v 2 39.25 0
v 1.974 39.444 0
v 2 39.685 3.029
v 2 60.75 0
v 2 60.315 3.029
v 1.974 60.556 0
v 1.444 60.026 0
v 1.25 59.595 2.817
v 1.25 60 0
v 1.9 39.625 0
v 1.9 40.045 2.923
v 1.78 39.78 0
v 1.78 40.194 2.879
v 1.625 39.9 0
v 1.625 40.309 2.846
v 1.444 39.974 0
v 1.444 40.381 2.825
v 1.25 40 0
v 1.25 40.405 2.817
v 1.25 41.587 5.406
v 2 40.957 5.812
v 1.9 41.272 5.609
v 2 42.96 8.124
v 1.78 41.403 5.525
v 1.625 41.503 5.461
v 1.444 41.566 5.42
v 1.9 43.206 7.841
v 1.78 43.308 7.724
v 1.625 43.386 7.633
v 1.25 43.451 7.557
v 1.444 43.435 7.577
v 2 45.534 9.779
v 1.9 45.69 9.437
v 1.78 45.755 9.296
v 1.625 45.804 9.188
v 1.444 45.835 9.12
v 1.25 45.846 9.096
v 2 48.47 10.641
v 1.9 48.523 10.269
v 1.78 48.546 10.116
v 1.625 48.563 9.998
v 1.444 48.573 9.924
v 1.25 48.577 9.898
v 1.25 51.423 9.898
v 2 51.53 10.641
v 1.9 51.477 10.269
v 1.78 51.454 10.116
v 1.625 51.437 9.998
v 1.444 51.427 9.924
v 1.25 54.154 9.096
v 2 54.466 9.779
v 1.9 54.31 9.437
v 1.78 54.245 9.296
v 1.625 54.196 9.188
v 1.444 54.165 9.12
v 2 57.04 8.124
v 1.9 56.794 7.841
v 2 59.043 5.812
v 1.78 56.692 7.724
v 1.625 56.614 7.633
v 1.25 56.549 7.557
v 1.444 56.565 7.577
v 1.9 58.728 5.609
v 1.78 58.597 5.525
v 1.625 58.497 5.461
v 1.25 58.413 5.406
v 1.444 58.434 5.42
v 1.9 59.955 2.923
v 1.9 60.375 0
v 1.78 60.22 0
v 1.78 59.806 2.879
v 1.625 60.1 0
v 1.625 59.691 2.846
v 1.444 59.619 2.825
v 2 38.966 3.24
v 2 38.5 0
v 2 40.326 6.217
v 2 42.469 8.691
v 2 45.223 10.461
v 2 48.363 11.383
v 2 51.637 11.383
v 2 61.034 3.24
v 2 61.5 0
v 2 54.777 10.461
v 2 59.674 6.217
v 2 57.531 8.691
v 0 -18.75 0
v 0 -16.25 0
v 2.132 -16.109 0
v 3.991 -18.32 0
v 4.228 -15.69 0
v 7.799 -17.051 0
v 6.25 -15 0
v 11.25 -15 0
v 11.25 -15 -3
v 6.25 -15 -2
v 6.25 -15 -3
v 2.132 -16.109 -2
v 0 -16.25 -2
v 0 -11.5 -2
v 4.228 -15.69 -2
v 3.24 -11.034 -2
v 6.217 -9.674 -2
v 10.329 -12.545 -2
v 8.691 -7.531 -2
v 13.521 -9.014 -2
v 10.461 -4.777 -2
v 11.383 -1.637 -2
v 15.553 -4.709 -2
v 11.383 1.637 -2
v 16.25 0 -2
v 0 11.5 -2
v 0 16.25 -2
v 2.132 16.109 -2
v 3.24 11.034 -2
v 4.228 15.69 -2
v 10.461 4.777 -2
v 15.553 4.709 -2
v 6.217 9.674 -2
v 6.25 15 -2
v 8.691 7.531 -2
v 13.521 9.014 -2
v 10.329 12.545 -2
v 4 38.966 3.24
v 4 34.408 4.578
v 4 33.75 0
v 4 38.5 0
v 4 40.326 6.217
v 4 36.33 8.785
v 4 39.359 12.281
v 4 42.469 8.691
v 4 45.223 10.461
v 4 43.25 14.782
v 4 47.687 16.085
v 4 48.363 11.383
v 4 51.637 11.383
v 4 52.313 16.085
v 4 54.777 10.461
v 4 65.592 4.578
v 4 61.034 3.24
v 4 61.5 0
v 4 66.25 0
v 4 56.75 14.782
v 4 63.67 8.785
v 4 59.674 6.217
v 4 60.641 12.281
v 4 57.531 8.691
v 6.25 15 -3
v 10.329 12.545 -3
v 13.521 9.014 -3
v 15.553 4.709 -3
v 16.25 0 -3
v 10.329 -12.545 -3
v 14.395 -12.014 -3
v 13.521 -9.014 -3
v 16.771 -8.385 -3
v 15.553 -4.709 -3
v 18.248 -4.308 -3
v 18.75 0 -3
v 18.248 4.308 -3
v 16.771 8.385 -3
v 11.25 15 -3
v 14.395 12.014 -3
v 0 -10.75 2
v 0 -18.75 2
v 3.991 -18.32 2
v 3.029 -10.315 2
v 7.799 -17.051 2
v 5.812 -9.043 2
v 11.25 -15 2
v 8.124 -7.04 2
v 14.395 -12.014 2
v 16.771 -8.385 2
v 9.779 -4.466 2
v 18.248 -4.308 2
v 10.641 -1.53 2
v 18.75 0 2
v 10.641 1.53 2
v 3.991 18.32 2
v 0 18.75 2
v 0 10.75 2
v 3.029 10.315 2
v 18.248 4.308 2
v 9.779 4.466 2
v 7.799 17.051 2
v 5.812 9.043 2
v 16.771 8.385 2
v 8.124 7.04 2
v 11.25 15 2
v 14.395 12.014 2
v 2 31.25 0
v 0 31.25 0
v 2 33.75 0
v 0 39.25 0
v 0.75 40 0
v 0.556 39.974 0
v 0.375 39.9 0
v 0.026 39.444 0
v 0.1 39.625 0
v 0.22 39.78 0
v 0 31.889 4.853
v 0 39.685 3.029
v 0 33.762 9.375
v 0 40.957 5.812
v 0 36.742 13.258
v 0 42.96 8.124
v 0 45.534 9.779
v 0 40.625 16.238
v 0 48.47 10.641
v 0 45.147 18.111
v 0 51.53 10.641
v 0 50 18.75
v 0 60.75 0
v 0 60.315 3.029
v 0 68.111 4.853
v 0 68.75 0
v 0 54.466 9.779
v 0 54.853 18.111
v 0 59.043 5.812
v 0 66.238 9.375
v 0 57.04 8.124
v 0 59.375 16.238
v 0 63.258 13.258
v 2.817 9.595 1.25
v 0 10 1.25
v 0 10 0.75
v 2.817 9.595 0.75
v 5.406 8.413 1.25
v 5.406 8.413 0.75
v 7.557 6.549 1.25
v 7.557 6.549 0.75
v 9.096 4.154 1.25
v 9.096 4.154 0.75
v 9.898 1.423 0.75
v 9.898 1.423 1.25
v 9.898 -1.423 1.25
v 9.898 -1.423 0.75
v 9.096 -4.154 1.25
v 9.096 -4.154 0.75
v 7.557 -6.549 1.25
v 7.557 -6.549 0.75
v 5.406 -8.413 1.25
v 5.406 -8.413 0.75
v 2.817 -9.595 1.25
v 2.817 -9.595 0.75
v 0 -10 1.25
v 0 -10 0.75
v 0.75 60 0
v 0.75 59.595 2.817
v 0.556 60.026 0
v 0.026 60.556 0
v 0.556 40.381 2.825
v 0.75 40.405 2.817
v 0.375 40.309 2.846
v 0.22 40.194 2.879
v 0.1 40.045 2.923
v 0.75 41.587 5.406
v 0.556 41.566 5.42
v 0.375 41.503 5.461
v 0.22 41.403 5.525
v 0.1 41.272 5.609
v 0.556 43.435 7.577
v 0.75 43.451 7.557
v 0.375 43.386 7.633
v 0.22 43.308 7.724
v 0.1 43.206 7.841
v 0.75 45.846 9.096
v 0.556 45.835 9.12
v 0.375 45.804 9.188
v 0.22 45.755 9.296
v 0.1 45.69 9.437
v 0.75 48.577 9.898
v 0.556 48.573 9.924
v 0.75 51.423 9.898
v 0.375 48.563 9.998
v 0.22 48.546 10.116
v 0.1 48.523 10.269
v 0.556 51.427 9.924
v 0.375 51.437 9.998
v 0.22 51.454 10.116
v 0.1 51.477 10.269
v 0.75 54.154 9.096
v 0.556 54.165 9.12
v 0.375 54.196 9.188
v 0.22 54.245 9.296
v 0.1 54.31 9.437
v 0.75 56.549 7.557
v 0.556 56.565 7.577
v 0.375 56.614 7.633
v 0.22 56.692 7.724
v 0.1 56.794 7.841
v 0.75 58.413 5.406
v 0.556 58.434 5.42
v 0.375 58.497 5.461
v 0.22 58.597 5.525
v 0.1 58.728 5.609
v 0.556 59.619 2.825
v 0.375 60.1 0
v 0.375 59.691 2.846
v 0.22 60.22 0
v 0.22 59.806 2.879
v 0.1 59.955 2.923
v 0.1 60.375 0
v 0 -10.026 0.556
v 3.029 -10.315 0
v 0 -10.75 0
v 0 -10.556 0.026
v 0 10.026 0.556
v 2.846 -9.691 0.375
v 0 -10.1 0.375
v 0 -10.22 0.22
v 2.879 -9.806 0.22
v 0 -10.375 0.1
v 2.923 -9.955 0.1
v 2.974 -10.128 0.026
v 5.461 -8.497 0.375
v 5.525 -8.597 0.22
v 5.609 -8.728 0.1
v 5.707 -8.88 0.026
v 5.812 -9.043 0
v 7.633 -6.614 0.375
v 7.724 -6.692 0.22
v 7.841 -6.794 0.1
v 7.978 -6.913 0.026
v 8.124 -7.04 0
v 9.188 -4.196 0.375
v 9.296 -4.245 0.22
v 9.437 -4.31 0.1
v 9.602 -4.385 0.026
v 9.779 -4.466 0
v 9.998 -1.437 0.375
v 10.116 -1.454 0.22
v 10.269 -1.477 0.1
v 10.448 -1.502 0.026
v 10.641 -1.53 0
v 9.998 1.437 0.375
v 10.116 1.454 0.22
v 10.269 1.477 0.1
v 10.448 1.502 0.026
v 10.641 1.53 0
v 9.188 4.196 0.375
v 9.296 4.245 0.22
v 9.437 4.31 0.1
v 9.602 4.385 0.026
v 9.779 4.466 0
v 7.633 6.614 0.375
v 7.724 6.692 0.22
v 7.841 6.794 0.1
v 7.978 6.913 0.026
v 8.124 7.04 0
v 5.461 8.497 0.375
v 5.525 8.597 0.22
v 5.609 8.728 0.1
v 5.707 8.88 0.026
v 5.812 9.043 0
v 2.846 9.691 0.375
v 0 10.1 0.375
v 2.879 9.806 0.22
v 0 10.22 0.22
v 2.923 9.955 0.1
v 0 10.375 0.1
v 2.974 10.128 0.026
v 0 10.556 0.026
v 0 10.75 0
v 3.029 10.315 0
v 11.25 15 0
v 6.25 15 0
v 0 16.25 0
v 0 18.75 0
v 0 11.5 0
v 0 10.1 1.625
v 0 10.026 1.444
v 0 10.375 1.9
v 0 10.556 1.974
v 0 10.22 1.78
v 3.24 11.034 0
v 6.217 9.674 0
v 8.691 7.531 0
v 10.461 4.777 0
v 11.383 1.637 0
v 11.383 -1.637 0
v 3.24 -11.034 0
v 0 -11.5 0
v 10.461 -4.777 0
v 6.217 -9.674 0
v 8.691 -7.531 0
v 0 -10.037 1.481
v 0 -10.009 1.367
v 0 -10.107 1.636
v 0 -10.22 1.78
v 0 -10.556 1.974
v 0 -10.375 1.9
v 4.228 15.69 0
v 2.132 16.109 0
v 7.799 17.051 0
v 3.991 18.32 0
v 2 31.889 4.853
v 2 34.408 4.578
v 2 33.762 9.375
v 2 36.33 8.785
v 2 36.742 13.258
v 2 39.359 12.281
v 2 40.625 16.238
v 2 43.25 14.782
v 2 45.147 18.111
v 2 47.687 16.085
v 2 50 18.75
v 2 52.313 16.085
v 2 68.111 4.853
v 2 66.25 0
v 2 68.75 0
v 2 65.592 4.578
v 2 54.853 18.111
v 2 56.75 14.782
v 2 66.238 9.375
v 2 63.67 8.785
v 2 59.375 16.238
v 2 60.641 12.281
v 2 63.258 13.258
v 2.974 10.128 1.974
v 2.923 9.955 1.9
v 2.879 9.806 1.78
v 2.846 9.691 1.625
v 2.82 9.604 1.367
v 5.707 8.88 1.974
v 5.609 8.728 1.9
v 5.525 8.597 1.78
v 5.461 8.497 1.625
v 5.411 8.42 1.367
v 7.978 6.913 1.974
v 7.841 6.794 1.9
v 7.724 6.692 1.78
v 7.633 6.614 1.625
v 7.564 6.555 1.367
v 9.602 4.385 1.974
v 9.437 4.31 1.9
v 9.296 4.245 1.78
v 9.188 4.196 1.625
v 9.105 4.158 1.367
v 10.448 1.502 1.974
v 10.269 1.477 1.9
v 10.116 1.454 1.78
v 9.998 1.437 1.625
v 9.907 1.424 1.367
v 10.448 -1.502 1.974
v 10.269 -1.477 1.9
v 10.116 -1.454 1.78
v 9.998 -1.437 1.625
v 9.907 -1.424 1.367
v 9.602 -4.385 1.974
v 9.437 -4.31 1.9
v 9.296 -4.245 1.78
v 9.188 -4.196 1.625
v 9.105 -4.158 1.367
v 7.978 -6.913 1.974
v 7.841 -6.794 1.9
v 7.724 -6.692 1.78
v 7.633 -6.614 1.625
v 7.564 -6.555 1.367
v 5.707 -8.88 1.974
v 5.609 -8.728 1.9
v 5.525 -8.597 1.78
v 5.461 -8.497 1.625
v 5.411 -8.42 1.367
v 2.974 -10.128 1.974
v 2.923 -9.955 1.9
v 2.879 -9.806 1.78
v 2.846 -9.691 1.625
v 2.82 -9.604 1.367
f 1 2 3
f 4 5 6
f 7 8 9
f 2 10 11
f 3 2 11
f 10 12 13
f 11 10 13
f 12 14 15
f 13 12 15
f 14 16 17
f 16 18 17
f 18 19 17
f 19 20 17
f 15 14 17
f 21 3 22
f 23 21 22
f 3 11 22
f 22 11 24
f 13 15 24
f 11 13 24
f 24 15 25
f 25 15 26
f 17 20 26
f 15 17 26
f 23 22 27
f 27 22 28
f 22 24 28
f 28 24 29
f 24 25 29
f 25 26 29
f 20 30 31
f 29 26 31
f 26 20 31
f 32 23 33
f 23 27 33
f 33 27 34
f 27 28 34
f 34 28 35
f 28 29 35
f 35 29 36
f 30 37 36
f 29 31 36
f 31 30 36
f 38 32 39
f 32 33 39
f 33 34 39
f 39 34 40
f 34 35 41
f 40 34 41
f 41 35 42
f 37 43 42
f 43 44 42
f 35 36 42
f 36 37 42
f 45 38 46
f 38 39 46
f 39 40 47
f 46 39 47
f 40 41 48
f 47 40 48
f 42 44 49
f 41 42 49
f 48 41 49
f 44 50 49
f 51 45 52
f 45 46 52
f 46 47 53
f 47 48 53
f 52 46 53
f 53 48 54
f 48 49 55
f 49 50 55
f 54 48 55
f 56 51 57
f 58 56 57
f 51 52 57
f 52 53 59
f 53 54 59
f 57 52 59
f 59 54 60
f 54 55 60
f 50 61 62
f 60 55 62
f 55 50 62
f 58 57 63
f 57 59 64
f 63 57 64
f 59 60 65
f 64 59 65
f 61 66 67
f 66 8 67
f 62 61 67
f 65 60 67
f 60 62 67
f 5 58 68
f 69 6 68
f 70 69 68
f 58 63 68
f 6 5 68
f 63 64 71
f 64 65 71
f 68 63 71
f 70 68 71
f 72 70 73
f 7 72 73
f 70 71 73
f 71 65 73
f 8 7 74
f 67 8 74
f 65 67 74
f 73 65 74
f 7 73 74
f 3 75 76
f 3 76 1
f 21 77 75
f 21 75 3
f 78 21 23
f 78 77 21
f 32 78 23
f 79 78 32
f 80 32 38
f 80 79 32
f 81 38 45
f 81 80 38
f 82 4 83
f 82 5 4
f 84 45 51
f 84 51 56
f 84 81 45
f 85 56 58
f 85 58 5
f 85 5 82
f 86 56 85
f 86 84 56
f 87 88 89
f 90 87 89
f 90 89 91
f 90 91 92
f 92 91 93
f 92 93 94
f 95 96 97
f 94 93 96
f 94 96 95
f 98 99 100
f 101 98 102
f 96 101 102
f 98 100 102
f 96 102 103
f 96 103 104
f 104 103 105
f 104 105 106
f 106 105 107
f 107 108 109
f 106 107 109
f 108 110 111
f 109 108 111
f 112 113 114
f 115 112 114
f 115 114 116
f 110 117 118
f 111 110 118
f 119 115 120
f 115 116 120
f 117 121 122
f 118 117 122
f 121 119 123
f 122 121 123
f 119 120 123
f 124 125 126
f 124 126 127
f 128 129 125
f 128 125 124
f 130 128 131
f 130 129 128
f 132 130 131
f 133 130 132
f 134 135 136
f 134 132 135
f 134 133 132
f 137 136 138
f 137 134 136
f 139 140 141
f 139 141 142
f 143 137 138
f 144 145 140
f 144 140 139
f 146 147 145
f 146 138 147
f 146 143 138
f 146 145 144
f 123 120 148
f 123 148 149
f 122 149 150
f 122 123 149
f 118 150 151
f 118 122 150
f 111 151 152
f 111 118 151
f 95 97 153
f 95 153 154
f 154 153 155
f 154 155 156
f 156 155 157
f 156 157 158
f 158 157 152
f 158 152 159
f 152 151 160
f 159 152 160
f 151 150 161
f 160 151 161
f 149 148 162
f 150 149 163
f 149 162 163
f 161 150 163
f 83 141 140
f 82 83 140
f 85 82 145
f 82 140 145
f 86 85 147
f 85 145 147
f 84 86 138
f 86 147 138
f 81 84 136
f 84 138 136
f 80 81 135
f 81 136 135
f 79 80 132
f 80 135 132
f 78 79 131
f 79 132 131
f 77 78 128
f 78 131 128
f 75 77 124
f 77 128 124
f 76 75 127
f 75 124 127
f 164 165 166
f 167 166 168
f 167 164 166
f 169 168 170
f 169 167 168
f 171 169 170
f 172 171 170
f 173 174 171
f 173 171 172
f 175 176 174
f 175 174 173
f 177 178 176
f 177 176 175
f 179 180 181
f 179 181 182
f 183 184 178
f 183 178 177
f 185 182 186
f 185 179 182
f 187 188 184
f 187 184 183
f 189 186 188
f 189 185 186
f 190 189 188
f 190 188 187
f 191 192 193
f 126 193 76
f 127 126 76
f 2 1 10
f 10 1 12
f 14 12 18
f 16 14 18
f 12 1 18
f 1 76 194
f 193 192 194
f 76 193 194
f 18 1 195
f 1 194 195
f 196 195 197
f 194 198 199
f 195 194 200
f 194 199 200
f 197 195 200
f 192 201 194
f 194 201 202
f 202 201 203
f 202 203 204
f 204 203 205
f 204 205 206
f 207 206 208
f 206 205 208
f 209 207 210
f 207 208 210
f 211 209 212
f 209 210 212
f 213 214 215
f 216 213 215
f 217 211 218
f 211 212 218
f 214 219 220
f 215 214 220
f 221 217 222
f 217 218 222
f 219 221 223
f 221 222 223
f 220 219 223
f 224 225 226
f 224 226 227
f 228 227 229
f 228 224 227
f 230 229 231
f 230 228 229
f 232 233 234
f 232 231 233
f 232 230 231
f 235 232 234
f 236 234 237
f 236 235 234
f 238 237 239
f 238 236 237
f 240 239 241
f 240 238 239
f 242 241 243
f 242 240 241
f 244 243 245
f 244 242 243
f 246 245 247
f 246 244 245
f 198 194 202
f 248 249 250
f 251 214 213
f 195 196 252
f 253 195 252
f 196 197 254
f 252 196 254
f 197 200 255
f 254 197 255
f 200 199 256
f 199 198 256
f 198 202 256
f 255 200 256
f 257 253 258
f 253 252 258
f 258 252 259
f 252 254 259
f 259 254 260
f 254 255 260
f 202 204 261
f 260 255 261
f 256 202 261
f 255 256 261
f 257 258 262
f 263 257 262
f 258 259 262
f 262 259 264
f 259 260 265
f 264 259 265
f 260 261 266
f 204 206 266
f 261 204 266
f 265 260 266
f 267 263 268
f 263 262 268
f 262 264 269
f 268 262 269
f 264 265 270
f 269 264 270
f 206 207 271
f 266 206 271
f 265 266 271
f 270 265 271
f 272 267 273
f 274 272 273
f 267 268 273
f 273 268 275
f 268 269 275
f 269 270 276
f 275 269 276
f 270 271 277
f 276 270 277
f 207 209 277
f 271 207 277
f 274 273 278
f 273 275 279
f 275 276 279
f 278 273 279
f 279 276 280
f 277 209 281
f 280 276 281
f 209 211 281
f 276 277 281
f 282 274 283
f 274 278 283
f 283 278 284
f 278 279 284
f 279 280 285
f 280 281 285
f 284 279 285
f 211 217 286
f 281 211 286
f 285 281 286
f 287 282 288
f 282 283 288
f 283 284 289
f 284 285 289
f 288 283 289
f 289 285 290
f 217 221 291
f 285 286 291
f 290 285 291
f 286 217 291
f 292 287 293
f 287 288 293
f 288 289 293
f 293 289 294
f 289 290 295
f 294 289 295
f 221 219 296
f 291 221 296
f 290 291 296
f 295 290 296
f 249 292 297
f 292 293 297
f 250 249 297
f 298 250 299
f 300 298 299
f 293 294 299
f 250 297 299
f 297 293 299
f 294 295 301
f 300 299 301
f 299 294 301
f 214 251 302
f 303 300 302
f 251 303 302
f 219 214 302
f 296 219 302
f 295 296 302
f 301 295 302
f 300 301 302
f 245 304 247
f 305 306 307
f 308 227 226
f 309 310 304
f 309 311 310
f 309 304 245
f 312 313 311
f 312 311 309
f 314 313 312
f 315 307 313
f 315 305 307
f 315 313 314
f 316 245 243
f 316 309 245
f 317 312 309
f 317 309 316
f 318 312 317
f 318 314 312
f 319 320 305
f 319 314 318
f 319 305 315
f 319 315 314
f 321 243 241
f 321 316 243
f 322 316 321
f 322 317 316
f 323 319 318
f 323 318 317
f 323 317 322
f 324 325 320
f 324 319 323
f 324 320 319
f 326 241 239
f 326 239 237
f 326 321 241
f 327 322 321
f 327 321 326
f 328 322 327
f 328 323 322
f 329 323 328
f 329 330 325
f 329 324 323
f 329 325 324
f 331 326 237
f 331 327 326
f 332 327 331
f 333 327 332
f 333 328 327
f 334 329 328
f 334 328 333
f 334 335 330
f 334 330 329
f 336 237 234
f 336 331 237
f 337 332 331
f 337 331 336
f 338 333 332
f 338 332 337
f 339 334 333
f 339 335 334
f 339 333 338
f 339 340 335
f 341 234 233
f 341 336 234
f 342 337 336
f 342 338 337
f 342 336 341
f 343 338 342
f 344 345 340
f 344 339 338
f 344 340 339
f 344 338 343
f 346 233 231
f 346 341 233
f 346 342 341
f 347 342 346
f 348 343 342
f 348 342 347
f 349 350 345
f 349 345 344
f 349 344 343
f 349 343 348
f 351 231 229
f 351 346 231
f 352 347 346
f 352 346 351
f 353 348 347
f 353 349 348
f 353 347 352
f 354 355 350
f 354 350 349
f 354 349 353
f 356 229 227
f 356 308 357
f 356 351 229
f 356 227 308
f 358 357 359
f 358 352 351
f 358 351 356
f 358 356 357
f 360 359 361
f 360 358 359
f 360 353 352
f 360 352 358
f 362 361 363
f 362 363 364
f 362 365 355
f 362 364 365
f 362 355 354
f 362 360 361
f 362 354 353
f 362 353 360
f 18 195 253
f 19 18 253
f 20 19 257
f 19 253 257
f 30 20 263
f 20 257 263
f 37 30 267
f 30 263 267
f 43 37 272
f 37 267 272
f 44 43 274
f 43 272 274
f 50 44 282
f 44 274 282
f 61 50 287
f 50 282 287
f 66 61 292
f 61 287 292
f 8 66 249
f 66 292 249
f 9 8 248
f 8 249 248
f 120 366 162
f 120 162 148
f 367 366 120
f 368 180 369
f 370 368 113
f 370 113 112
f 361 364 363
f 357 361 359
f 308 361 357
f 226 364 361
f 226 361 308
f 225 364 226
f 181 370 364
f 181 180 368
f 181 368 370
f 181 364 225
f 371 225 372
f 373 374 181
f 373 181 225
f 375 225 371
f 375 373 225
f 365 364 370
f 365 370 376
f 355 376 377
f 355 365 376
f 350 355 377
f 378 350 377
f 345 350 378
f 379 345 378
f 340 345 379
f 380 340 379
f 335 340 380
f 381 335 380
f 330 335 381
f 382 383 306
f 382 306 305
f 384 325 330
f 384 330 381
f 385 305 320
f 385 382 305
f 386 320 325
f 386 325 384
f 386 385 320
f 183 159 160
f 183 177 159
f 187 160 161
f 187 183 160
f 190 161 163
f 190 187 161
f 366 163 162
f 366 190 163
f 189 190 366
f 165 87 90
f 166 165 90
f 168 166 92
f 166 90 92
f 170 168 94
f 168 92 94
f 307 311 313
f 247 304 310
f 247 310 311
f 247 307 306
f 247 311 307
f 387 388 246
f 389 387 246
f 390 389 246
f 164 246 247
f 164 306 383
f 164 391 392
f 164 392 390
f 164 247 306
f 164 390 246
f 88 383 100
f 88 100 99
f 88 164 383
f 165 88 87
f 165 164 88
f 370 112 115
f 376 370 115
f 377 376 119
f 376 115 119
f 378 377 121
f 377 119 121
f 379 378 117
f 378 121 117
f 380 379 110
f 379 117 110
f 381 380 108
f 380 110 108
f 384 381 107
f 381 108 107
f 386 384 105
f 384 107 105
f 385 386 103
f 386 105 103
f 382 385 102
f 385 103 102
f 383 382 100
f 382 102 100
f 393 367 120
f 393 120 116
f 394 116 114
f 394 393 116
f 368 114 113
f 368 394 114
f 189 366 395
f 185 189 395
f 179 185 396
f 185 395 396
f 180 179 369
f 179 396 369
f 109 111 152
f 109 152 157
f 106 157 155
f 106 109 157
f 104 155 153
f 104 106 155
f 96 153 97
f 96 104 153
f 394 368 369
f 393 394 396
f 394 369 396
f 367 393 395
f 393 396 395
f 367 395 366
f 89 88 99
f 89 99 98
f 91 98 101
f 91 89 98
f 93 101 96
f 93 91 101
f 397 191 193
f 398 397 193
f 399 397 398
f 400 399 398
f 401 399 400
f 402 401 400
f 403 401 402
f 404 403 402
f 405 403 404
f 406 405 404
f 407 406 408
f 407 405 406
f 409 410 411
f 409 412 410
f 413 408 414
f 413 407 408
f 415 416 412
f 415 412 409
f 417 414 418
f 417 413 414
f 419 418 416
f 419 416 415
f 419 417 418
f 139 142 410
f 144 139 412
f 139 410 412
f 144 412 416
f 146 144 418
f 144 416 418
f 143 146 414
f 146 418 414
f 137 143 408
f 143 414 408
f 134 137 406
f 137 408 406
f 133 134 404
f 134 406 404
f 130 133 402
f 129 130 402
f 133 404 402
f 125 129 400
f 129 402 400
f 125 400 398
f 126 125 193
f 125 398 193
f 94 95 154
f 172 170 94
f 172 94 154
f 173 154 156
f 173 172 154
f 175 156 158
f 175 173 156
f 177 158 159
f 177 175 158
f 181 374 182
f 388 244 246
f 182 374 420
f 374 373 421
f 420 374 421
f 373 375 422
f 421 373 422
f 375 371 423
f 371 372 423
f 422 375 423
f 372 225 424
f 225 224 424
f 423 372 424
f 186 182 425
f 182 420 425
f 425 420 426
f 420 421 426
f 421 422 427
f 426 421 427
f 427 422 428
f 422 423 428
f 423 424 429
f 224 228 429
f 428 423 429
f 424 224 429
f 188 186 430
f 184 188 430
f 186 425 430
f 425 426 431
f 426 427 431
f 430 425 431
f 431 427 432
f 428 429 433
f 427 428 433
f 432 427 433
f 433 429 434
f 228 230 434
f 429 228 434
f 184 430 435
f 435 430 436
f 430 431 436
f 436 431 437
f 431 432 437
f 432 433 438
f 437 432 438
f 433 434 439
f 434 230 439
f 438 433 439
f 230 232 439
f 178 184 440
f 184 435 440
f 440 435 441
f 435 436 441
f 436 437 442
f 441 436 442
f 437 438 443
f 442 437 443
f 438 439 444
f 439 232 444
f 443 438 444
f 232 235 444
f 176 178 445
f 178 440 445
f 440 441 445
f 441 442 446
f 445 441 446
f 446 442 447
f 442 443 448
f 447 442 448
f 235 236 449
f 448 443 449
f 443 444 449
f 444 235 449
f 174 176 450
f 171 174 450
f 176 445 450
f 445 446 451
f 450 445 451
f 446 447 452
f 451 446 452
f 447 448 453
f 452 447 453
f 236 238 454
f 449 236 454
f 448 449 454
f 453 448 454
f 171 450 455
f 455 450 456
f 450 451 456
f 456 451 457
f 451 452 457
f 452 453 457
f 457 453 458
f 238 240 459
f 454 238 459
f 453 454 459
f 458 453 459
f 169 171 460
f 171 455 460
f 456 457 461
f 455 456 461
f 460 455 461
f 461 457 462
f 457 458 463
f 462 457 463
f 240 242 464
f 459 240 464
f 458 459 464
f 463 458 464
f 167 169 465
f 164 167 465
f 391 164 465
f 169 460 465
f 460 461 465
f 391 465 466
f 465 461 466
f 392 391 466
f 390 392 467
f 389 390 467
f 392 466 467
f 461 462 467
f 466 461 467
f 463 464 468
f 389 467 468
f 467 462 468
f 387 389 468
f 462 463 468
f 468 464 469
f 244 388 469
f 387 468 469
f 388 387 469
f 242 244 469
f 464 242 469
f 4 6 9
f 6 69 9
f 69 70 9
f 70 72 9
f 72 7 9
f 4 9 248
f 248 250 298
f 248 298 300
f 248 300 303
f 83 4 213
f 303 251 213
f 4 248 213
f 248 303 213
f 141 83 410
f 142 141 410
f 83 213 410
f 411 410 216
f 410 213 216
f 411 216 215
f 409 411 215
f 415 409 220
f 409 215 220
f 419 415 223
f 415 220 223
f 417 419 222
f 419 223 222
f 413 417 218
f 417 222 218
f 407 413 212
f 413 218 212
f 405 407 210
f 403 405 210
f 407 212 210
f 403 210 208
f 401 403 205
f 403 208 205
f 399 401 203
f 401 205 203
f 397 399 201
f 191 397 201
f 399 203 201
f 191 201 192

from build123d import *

# Parameters (mm, degrees)
F1_DEPTH  = 2
F2_DEPTH  = 3
F3_DEPTH  = 2
F5_DEPTH  = 4
F6_DEPTH  = 2
F8_DEPTH  = 2
F9_R      = 0.75
F11_DEPTH = 2
F12_R     = 0.75


with BuildPart() as f1:
    # F0 (on Top) → F1 (new body)
    with BuildSketch(Plane.XY):
        with BuildLine():
            ThreePointArc((0, 16.25), (3.186887196, 15.93443598), (6.25, 15))
            Line((6.25, 15), (11.25, 15))
            ThreePointArc((11.25, 15), (5.9292706128, 17.7878118384), (0, 18.75))
            Line((0, 18.75), (0, 16.25))
        make_face()
        with BuildLine():
            ThreePointArc((6.25, 15), (13.520817283, 9.0138781887), (16.25, 0))
            ThreePointArc((16.25, 0), (13.520817283, -9.0138781887), (6.25, -15))
            Line((6.25, -15), (11.25, -15))
            ThreePointArc((11.25, -15), (16.7705098312, -8.3852549156), (18.75, 0))
            ThreePointArc((18.75, 0), (16.7705098312, 8.3852549156), (11.25, 15))
            Line((11.25, 15), (6.25, 15))
        make_face()
        with BuildLine():
            Line((11.25, -15), (6.25, -15))
            ThreePointArc((6.25, -15), (3.186887196, -15.93443598), (0, -16.25))
            Line((0, -16.25), (0, -18.75))
            ThreePointArc((0, -18.75), (5.9292706128, -17.7878118384), (11.25, -15))
        make_face()
        with BuildLine():
            ThreePointArc((6.25, -15), (13.520817283, -9.0138781887), (16.25, 0))
            ThreePointArc((16.25, 0), (13.520817283, 9.0138781887), (6.25, 15))
            ThreePointArc((6.25, 15), (3.186887196, 15.93443598), (0, 16.25))
            Line((0, 16.25), (0, 10))
            ThreePointArc((0, 10), (7.0710678119, 7.0710678119), (10, 0))
            ThreePointArc((10, 0), (7.0710678119, -7.0710678119), (0, -10))
            Line((0, -10), (0, -16.25))
            ThreePointArc((0, -16.25), (3.186887196, -15.93443598), (6.25, -15))
        make_face()
    extrude(amount=F1_DEPTH)

    # F0 (on Top) → F2 (join)
    with BuildSketch(Plane.XY):
        with BuildLine():
            ThreePointArc((6.25, 15), (13.520817283, 9.0138781887), (16.25, 0))
            ThreePointArc((16.25, 0), (13.520817283, -9.0138781887), (6.25, -15))
            Line((6.25, -15), (11.25, -15))
            ThreePointArc((11.25, -15), (16.7705098312, -8.3852549156), (18.75, 0))
            ThreePointArc((18.75, 0), (16.7705098312, 8.3852549156), (11.25, 15))
            Line((11.25, 15), (6.25, 15))
        make_face()
    extrude(amount=-F2_DEPTH)

    # F0 (on Top) → F3 (join)
    with BuildSketch(Plane.XY):
        with BuildLine():
            ThreePointArc((6.25, -15), (13.520817283, -9.0138781887), (16.25, 0))
            ThreePointArc((16.25, 0), (13.520817283, 9.0138781887), (6.25, 15))
            ThreePointArc((6.25, 15), (3.186887196, 15.93443598), (0, 16.25))
            Line((0, 16.25), (0, 10))
            ThreePointArc((0, 10), (7.0710678119, 7.0710678119), (10, 0))
            ThreePointArc((10, 0), (7.0710678119, -7.0710678119), (0, -10))
            Line((0, -10), (0, -16.25))
            ThreePointArc((0, -16.25), (3.186887196, -15.93443598), (6.25, -15))
        make_face()
    extrude(amount=-F3_DEPTH)

    # F10 (on face) → F11 (cut)
    with BuildSketch(Plane(origin=(0, 0, -2), x_dir=(1, 0, 0), z_dir=(0, 0, -1))):
        with BuildLine():
            Line((0, -10), (0, -11.5))
            ThreePointArc((0, -11.5), (11.5, 0), (0, 11.5))
            Line((0, 11.5), (0, 10))
            ThreePointArc((0, 10), (10, 0), (0, -10))
        make_face()
    extrude(amount=-F11_DEPTH, mode=Mode.SUBTRACT)

    # F12
    f12_edges = [f1.edges().sort_by_distance(p)[0] for p in [
        (10, 0, 0),
        (10, 0, 2),
    ]]
    fillet(f12_edges, radius=F12_R)


with BuildPart() as f5:
    # F4 (on Right) → F5 (new body)
    with BuildSketch(Plane.YZ):
        with BuildLine():
            Line((60, 0), (66.25, 0))
            ThreePointArc((66.25, 0), (50, 16.25), (33.75, 0))
            Line((33.75, 0), (40, 0))
            ThreePointArc((40, 0), (50, 10), (60, 0))
        make_face()
    extrude(amount=F5_DEPTH)

    # F4 (on Right) → F6 (join)
    with BuildSketch(Plane.YZ):
        with BuildLine():
            Line((66.25, 0), (68.75, 0))
            ThreePointArc((68.75, 0), (50, 18.75), (31.25, 0))
            Line((31.25, 0), (33.75, 0))
            ThreePointArc((33.75, 0), (50, 16.25), (66.25, 0))
        make_face()
    extrude(amount=F6_DEPTH)

    # F7 (on face) → F8 (cut)
    with BuildSketch(Plane.YZ.offset(4)):
        with BuildLine():
            Line((60, 0), (61.5, 0))
            ThreePointArc((61.5, 0), (50, 11.5), (38.5, 0))
            Line((38.5, 0), (40, 0))
            ThreePointArc((40, 0), (50, 10), (60, 0))
        make_face()
    extrude(amount=-F8_DEPTH, mode=Mode.SUBTRACT)

    # F9
    f9_edges = [f5.edges().sort_by_distance(p)[0] for p in [
        (0, 50, 10),
        (2, 50, 10),
    ]]
    fillet(f9_edges, radius=F9_R)


solid = Compound([f1.part, f5.part])
